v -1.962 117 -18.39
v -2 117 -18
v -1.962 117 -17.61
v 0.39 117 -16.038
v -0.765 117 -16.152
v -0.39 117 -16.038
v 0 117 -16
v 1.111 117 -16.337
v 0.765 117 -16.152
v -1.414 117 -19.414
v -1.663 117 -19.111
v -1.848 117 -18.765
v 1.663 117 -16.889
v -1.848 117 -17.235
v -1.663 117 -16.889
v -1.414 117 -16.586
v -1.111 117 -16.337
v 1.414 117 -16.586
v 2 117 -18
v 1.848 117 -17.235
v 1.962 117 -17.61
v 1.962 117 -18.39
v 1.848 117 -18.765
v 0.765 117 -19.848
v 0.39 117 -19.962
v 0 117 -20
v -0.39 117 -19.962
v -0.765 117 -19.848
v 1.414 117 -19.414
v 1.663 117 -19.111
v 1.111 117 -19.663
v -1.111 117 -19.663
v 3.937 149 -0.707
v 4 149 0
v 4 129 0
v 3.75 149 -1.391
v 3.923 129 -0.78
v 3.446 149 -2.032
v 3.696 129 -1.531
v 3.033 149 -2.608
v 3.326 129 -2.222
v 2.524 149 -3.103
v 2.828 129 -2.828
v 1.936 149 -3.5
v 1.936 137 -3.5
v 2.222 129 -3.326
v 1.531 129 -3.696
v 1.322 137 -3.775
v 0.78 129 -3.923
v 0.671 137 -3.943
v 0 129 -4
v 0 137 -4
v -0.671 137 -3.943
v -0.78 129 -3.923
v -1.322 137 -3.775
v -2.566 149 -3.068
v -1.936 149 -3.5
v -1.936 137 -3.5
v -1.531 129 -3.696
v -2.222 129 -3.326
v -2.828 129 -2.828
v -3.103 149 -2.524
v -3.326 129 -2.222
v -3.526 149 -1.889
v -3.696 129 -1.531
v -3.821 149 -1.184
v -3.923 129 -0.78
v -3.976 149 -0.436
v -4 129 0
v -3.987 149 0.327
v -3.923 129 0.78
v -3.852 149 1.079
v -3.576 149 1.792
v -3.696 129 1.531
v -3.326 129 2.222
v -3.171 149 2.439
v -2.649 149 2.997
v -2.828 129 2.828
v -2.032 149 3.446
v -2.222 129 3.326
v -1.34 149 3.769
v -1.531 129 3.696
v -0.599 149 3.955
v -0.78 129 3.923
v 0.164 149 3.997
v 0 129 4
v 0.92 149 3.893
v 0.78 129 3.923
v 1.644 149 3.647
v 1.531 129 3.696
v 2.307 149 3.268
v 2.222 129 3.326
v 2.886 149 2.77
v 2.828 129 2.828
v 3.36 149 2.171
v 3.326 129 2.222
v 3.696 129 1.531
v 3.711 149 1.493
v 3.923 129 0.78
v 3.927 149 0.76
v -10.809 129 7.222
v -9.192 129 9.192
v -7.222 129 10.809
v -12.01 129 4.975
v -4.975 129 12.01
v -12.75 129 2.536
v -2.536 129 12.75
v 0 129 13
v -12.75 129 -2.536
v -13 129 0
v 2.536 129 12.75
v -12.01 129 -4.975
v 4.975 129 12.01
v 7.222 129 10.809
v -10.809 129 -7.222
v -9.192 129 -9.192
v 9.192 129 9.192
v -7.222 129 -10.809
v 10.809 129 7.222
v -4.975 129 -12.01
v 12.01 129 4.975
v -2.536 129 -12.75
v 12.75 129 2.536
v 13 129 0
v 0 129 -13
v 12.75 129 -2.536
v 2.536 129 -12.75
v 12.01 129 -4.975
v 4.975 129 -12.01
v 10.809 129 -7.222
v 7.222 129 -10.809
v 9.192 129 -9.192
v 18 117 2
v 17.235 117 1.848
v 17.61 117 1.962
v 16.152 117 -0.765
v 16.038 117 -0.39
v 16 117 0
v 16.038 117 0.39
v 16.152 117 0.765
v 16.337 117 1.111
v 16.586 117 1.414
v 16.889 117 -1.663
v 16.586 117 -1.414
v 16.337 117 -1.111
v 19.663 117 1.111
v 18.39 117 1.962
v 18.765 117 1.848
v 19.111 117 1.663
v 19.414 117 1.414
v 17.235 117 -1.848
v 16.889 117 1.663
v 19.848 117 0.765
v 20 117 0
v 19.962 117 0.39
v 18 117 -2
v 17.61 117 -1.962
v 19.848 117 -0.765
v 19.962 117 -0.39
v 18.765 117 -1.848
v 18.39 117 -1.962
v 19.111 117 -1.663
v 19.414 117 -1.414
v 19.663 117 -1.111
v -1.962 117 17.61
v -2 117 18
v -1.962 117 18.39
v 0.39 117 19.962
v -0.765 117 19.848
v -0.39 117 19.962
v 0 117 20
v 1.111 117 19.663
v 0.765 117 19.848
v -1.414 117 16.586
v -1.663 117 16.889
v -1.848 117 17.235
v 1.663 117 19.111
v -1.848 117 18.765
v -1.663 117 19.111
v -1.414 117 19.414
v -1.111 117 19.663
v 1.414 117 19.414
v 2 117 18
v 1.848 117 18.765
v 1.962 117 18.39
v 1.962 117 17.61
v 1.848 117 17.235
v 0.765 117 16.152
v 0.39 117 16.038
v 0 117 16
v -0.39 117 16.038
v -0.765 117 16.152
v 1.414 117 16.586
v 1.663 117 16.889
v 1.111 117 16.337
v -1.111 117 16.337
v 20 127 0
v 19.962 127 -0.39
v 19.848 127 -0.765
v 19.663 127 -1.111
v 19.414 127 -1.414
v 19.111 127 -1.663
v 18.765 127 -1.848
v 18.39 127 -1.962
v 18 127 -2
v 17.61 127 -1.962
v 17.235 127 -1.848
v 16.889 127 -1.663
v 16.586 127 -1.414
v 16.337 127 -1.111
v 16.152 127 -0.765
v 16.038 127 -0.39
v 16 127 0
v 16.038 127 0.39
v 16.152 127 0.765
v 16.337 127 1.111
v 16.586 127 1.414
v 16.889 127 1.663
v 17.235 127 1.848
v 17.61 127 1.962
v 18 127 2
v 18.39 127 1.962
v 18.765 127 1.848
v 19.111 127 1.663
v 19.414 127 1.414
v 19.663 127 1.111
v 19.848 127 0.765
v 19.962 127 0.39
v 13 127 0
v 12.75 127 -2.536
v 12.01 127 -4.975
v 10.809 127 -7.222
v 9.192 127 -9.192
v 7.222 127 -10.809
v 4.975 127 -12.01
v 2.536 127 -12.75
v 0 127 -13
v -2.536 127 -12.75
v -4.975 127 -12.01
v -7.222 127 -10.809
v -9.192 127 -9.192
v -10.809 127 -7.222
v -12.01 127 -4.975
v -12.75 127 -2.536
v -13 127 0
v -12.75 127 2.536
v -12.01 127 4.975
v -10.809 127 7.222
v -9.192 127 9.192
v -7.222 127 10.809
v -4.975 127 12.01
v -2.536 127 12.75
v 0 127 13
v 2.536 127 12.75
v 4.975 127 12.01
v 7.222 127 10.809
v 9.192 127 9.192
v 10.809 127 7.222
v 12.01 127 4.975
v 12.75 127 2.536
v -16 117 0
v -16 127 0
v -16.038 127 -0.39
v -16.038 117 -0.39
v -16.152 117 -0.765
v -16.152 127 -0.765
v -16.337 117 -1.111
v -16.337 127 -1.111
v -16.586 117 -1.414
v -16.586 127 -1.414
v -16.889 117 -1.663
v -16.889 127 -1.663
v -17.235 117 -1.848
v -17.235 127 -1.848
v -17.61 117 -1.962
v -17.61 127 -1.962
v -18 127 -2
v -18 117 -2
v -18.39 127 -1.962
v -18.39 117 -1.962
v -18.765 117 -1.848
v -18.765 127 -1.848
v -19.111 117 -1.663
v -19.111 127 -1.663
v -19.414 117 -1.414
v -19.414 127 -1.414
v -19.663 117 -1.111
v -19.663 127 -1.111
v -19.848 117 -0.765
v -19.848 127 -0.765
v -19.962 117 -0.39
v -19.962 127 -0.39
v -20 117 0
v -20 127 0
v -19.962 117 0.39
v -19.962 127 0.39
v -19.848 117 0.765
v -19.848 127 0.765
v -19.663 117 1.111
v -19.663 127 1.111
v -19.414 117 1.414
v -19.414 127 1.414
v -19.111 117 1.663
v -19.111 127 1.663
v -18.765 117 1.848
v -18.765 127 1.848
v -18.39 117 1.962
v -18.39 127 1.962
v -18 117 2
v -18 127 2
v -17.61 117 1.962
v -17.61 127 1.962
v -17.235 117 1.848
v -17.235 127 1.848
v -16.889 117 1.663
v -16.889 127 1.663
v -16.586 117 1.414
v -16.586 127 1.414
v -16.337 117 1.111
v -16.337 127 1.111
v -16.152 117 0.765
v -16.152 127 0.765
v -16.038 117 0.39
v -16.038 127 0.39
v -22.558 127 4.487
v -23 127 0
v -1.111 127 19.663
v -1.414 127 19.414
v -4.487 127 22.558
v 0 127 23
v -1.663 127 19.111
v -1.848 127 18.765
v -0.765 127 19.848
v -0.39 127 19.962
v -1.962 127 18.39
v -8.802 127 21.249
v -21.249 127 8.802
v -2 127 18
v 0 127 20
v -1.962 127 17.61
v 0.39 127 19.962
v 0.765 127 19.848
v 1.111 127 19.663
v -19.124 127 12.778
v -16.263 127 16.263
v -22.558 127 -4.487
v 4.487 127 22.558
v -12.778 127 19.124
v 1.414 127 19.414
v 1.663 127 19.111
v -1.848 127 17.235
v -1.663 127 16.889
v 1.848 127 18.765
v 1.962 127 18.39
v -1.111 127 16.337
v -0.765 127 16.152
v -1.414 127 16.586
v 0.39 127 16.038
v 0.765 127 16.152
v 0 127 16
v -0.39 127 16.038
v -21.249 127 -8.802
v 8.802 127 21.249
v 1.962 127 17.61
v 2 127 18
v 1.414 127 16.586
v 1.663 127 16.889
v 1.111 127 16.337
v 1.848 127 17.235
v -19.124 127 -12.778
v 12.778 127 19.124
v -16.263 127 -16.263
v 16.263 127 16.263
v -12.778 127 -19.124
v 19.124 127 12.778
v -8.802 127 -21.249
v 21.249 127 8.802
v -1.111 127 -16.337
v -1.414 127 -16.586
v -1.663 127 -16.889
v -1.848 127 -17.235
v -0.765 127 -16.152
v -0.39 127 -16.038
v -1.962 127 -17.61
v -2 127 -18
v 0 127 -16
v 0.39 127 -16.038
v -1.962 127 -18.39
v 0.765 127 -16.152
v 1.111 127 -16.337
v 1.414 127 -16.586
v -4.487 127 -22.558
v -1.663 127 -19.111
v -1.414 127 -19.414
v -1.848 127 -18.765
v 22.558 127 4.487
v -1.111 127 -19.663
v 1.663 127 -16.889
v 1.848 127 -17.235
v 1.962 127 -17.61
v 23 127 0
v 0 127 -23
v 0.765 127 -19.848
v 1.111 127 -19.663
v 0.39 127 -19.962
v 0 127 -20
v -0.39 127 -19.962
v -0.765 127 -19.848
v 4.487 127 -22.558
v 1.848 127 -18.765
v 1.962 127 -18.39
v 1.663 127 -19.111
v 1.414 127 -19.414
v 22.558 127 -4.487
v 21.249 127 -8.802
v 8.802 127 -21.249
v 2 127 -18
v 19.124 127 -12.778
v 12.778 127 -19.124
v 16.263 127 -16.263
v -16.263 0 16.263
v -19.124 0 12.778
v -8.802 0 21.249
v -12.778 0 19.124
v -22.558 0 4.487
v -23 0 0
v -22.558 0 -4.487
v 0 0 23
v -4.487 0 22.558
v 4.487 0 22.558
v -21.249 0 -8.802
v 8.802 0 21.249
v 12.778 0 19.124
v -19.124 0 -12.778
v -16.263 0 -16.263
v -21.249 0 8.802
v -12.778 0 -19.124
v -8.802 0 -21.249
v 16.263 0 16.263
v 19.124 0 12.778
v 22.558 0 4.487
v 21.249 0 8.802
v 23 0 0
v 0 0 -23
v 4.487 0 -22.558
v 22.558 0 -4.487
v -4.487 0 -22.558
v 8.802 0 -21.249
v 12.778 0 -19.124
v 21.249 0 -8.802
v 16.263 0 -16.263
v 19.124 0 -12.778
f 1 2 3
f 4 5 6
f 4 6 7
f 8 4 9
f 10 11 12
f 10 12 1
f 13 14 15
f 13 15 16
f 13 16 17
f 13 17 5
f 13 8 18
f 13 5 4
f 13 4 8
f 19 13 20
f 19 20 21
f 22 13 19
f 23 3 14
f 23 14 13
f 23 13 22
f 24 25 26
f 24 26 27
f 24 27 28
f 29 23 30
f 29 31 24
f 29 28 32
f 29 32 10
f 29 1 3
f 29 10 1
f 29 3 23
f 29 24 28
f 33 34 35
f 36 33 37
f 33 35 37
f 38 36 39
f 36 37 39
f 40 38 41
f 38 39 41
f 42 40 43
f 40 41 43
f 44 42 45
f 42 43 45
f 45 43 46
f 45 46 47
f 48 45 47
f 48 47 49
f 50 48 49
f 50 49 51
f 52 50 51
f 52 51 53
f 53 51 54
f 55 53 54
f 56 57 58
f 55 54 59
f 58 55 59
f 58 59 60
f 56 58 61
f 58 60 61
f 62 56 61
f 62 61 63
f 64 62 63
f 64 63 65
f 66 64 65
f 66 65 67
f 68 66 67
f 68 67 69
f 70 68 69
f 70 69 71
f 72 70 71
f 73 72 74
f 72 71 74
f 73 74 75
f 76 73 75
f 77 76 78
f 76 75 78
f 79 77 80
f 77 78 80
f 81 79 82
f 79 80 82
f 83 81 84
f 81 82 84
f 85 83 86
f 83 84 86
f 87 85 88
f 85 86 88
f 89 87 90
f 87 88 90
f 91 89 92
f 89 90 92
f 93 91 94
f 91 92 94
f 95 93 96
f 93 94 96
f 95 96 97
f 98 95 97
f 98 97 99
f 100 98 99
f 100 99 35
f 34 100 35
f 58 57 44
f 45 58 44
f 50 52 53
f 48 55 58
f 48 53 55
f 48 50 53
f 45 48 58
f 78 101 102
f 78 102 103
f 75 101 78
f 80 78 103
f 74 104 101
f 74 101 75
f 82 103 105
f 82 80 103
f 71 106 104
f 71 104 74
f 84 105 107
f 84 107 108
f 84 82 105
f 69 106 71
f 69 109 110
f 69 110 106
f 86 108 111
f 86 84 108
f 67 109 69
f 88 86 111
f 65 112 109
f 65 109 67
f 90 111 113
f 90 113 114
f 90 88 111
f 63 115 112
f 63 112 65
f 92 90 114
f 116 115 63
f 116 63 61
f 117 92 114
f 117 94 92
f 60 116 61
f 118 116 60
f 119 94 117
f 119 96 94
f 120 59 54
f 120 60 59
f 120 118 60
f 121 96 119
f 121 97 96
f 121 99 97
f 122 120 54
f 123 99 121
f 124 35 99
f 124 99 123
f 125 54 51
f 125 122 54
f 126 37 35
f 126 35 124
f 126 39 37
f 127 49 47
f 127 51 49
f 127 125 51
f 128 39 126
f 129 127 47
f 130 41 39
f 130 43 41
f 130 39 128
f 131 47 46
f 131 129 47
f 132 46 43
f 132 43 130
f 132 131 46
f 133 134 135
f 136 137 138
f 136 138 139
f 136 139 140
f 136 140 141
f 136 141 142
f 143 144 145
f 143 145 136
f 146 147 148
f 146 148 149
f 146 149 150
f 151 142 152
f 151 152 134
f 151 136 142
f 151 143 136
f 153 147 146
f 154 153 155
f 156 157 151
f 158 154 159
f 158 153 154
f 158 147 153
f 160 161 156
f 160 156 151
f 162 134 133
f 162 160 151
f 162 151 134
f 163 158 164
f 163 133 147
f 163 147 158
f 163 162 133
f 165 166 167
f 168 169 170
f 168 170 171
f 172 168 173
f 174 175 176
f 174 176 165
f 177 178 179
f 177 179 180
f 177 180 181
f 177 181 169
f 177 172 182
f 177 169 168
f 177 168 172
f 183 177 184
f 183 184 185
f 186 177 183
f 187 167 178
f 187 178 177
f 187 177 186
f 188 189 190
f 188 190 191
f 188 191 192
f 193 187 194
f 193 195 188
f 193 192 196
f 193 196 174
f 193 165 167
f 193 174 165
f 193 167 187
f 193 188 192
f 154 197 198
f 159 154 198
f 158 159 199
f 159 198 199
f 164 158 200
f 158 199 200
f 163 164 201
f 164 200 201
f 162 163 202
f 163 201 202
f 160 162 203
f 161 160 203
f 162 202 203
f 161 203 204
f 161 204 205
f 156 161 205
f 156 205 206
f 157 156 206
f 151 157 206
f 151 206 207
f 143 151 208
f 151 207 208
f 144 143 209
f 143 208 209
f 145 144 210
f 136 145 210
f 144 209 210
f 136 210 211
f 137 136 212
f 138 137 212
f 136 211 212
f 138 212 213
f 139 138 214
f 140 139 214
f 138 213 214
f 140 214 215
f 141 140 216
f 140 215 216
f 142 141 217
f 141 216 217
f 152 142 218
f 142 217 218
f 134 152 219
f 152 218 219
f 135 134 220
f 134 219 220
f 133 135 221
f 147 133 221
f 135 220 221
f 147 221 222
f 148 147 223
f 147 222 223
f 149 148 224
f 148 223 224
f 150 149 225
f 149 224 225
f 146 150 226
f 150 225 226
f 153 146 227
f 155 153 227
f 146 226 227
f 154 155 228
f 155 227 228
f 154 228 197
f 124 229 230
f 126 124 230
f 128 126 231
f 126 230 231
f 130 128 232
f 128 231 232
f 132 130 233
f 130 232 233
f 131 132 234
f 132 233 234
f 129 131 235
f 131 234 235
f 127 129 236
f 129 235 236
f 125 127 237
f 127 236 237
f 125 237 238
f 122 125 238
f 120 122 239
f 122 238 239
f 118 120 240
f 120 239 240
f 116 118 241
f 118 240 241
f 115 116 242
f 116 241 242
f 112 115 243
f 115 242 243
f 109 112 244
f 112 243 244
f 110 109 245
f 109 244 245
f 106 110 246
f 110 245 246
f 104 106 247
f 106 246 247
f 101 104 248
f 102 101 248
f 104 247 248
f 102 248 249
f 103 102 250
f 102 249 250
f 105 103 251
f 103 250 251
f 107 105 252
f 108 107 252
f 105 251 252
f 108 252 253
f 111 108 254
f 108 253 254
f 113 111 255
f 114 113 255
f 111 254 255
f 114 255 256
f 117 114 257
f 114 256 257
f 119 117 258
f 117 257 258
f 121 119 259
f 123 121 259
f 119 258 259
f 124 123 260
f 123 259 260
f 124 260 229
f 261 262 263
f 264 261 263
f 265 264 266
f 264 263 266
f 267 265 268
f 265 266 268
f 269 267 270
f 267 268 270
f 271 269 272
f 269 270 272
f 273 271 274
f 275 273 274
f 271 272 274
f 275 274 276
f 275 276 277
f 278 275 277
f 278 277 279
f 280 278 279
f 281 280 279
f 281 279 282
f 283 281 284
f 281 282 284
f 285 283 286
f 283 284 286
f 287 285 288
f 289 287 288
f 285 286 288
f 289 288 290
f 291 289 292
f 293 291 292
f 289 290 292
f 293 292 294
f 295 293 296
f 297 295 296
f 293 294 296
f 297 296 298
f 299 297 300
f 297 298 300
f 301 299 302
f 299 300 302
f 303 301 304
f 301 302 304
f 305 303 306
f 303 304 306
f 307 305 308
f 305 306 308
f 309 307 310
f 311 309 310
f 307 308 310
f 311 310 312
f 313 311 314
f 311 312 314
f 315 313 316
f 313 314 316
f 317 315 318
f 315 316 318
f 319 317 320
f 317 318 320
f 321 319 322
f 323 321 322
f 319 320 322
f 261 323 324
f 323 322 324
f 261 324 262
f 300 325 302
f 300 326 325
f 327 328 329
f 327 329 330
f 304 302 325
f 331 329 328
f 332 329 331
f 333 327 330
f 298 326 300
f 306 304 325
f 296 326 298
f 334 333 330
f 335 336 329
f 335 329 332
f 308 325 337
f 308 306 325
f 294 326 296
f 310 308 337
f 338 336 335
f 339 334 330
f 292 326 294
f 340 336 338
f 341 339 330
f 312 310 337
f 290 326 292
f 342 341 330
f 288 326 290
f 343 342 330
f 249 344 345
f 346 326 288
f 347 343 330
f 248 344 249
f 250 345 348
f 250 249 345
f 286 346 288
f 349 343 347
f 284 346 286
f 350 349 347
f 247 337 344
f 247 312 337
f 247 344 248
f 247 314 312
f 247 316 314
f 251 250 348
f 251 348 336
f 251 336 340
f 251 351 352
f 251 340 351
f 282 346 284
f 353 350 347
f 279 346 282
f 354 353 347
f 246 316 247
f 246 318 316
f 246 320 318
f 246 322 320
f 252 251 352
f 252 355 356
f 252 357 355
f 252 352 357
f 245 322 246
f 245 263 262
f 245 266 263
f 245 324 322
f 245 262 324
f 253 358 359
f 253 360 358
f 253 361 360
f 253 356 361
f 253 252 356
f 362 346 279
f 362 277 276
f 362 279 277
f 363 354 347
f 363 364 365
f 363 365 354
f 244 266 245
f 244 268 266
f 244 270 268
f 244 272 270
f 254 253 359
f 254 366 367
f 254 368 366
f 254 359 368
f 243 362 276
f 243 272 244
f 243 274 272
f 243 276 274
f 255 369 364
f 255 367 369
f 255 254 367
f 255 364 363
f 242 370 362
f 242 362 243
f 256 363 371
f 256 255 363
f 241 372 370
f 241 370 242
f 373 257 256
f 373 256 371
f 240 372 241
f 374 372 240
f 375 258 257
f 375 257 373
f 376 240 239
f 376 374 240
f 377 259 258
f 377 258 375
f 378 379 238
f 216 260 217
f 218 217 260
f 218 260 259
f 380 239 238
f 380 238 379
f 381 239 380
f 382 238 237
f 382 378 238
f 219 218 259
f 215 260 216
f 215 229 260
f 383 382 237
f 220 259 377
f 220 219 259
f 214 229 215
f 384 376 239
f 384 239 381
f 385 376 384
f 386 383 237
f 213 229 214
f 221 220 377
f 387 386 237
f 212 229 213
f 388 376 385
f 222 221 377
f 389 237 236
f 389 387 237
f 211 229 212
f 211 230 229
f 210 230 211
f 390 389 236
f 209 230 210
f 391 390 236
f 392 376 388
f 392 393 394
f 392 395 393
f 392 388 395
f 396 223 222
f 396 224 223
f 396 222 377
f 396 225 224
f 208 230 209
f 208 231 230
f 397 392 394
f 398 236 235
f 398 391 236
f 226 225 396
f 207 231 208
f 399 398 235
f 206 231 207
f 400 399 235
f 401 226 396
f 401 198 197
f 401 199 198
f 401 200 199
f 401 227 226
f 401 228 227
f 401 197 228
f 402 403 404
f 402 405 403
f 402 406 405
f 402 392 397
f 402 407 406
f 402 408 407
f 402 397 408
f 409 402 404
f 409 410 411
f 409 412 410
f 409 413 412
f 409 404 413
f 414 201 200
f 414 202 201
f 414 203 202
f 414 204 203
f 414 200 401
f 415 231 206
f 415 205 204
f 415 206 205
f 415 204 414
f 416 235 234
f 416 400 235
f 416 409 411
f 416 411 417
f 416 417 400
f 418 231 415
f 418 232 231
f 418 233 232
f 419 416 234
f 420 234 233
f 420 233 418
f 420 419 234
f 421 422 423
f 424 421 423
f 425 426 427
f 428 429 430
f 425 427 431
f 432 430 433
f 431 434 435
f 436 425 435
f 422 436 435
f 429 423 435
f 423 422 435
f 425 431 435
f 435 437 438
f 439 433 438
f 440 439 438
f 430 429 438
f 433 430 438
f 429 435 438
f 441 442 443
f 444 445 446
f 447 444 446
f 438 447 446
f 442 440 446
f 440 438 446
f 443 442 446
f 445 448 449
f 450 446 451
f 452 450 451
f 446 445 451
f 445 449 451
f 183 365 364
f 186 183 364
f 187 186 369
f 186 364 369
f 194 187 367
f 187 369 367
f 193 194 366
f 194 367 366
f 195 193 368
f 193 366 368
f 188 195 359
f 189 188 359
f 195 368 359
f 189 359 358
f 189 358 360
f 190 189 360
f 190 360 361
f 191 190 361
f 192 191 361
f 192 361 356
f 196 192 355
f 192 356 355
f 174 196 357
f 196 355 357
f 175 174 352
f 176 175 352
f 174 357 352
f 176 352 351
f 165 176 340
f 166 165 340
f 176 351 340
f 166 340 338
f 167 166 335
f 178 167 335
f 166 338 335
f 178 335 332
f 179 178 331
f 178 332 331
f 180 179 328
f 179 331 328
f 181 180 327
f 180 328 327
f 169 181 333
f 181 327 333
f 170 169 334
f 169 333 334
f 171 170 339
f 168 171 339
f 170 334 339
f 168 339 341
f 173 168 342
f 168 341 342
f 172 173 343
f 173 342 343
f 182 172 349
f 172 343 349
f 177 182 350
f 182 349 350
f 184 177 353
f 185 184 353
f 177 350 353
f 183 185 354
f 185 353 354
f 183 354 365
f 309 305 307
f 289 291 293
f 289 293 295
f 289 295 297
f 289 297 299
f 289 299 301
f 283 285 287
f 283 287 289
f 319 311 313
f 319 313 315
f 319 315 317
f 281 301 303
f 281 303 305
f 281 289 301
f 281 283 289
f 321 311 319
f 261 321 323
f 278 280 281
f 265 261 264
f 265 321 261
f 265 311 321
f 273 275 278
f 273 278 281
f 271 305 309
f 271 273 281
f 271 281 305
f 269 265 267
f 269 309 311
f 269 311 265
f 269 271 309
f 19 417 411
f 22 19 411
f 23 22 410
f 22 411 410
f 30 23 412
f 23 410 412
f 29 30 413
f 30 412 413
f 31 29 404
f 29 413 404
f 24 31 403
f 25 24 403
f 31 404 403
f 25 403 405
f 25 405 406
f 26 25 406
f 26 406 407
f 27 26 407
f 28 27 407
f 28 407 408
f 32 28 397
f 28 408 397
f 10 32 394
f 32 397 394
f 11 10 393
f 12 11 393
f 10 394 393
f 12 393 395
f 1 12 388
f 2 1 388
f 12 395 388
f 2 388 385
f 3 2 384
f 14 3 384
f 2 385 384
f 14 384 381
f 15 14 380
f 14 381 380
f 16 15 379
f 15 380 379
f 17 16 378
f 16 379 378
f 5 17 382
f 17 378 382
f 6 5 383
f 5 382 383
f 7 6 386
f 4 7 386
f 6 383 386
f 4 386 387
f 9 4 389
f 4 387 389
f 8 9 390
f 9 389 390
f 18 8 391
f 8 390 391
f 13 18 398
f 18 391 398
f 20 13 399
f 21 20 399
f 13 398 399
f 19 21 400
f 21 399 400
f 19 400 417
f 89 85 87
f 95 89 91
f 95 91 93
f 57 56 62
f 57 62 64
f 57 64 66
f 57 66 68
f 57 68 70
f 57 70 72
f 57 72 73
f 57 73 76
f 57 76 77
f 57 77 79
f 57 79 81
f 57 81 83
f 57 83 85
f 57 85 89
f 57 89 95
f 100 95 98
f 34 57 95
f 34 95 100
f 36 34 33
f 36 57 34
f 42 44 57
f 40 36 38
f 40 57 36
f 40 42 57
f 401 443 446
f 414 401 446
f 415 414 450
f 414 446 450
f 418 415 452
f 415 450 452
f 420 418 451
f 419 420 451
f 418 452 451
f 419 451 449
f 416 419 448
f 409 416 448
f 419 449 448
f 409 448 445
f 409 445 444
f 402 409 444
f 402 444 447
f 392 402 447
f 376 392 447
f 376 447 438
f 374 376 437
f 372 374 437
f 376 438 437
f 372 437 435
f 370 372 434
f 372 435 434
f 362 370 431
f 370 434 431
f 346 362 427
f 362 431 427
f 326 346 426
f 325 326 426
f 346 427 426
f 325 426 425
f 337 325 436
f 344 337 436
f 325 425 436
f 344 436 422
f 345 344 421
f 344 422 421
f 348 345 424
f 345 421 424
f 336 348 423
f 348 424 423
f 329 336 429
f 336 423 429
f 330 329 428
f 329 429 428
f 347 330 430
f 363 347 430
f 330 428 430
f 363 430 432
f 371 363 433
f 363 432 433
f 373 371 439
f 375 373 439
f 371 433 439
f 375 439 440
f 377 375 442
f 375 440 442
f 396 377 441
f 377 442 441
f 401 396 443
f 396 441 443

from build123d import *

# Parameters (mm, degrees)
SKETCH2_R           = 23
BOSS_EXTRUDE1_DEPTH = 127
SKETCH3_R           = 13
BOSS_EXTRUDE2_DEPTH = 2
SKETCH4_R           = 4
BOSS_EXTRUDE3_DEPTH = 20
SKETCH8_R           = 2
CUT_EXTRUDE1_DEPTH  = 10
CUT_EXTRUDE2_DEPTH  = 12


with BuildPart() as part:
    # Sketch2 → Boss-Extrude1 (new body)
    with BuildSketch(Plane(origin=(0, 0, 0), x_dir=(1, 0, 0), z_dir=(0, 1, 0))):
        Circle(SKETCH2_R)
    extrude(amount=BOSS_EXTRUDE1_DEPTH)

    # Sketch3 → Boss-Extrude2 (add)
    with BuildSketch(Plane(origin=(0, 127, 0), x_dir=(1, 0, 0), z_dir=(0, 1, 0))):
        Circle(SKETCH3_R)
    extrude(amount=BOSS_EXTRUDE2_DEPTH)

    # Sketch4 → Boss-Extrude3 (add)
    with BuildSketch(Plane(origin=(0, 129, 0), x_dir=(1, 0, 0), z_dir=(0, 1, 0))):
        Circle(SKETCH4_R)
    extrude(amount=BOSS_EXTRUDE3_DEPTH)

    # Sketch8 → Cut-Extrude1 (cut)
    with BuildSketch(Plane(origin=(0, 127, 0), x_dir=(1, 0, 0), z_dir=(0, 1, 0))):
        with Locations((0, 18)):
            Circle(SKETCH8_R)
        with Locations((18, 0)):
            Circle(SKETCH8_R)
        with Locations((0, -18)):
            Circle(SKETCH8_R)
        with Locations((-18, 0)):
            Circle(SKETCH8_R)
    extrude(amount=-CUT_EXTRUDE1_DEPTH, mode=Mode.SUBTRACT)

    # Sketch10 → Cut-Extrude2 (cut)
    with BuildSketch(Plane(origin=(0, 149, 0), x_dir=(1, 0, 0), z_dir=(0, 1, 0))):
        Polygon((-84.712273825, 3.5), (-1.936491673, 3.5), (1.936491673, 3.5), (84.712273825, 3.5), (84.712273825, 169.051564304), (-84.712273825, 169.051564304), align=None)
    extrude(amount=-CUT_EXTRUDE2_DEPTH, mode=Mode.SUBTRACT)


solid = part.part
